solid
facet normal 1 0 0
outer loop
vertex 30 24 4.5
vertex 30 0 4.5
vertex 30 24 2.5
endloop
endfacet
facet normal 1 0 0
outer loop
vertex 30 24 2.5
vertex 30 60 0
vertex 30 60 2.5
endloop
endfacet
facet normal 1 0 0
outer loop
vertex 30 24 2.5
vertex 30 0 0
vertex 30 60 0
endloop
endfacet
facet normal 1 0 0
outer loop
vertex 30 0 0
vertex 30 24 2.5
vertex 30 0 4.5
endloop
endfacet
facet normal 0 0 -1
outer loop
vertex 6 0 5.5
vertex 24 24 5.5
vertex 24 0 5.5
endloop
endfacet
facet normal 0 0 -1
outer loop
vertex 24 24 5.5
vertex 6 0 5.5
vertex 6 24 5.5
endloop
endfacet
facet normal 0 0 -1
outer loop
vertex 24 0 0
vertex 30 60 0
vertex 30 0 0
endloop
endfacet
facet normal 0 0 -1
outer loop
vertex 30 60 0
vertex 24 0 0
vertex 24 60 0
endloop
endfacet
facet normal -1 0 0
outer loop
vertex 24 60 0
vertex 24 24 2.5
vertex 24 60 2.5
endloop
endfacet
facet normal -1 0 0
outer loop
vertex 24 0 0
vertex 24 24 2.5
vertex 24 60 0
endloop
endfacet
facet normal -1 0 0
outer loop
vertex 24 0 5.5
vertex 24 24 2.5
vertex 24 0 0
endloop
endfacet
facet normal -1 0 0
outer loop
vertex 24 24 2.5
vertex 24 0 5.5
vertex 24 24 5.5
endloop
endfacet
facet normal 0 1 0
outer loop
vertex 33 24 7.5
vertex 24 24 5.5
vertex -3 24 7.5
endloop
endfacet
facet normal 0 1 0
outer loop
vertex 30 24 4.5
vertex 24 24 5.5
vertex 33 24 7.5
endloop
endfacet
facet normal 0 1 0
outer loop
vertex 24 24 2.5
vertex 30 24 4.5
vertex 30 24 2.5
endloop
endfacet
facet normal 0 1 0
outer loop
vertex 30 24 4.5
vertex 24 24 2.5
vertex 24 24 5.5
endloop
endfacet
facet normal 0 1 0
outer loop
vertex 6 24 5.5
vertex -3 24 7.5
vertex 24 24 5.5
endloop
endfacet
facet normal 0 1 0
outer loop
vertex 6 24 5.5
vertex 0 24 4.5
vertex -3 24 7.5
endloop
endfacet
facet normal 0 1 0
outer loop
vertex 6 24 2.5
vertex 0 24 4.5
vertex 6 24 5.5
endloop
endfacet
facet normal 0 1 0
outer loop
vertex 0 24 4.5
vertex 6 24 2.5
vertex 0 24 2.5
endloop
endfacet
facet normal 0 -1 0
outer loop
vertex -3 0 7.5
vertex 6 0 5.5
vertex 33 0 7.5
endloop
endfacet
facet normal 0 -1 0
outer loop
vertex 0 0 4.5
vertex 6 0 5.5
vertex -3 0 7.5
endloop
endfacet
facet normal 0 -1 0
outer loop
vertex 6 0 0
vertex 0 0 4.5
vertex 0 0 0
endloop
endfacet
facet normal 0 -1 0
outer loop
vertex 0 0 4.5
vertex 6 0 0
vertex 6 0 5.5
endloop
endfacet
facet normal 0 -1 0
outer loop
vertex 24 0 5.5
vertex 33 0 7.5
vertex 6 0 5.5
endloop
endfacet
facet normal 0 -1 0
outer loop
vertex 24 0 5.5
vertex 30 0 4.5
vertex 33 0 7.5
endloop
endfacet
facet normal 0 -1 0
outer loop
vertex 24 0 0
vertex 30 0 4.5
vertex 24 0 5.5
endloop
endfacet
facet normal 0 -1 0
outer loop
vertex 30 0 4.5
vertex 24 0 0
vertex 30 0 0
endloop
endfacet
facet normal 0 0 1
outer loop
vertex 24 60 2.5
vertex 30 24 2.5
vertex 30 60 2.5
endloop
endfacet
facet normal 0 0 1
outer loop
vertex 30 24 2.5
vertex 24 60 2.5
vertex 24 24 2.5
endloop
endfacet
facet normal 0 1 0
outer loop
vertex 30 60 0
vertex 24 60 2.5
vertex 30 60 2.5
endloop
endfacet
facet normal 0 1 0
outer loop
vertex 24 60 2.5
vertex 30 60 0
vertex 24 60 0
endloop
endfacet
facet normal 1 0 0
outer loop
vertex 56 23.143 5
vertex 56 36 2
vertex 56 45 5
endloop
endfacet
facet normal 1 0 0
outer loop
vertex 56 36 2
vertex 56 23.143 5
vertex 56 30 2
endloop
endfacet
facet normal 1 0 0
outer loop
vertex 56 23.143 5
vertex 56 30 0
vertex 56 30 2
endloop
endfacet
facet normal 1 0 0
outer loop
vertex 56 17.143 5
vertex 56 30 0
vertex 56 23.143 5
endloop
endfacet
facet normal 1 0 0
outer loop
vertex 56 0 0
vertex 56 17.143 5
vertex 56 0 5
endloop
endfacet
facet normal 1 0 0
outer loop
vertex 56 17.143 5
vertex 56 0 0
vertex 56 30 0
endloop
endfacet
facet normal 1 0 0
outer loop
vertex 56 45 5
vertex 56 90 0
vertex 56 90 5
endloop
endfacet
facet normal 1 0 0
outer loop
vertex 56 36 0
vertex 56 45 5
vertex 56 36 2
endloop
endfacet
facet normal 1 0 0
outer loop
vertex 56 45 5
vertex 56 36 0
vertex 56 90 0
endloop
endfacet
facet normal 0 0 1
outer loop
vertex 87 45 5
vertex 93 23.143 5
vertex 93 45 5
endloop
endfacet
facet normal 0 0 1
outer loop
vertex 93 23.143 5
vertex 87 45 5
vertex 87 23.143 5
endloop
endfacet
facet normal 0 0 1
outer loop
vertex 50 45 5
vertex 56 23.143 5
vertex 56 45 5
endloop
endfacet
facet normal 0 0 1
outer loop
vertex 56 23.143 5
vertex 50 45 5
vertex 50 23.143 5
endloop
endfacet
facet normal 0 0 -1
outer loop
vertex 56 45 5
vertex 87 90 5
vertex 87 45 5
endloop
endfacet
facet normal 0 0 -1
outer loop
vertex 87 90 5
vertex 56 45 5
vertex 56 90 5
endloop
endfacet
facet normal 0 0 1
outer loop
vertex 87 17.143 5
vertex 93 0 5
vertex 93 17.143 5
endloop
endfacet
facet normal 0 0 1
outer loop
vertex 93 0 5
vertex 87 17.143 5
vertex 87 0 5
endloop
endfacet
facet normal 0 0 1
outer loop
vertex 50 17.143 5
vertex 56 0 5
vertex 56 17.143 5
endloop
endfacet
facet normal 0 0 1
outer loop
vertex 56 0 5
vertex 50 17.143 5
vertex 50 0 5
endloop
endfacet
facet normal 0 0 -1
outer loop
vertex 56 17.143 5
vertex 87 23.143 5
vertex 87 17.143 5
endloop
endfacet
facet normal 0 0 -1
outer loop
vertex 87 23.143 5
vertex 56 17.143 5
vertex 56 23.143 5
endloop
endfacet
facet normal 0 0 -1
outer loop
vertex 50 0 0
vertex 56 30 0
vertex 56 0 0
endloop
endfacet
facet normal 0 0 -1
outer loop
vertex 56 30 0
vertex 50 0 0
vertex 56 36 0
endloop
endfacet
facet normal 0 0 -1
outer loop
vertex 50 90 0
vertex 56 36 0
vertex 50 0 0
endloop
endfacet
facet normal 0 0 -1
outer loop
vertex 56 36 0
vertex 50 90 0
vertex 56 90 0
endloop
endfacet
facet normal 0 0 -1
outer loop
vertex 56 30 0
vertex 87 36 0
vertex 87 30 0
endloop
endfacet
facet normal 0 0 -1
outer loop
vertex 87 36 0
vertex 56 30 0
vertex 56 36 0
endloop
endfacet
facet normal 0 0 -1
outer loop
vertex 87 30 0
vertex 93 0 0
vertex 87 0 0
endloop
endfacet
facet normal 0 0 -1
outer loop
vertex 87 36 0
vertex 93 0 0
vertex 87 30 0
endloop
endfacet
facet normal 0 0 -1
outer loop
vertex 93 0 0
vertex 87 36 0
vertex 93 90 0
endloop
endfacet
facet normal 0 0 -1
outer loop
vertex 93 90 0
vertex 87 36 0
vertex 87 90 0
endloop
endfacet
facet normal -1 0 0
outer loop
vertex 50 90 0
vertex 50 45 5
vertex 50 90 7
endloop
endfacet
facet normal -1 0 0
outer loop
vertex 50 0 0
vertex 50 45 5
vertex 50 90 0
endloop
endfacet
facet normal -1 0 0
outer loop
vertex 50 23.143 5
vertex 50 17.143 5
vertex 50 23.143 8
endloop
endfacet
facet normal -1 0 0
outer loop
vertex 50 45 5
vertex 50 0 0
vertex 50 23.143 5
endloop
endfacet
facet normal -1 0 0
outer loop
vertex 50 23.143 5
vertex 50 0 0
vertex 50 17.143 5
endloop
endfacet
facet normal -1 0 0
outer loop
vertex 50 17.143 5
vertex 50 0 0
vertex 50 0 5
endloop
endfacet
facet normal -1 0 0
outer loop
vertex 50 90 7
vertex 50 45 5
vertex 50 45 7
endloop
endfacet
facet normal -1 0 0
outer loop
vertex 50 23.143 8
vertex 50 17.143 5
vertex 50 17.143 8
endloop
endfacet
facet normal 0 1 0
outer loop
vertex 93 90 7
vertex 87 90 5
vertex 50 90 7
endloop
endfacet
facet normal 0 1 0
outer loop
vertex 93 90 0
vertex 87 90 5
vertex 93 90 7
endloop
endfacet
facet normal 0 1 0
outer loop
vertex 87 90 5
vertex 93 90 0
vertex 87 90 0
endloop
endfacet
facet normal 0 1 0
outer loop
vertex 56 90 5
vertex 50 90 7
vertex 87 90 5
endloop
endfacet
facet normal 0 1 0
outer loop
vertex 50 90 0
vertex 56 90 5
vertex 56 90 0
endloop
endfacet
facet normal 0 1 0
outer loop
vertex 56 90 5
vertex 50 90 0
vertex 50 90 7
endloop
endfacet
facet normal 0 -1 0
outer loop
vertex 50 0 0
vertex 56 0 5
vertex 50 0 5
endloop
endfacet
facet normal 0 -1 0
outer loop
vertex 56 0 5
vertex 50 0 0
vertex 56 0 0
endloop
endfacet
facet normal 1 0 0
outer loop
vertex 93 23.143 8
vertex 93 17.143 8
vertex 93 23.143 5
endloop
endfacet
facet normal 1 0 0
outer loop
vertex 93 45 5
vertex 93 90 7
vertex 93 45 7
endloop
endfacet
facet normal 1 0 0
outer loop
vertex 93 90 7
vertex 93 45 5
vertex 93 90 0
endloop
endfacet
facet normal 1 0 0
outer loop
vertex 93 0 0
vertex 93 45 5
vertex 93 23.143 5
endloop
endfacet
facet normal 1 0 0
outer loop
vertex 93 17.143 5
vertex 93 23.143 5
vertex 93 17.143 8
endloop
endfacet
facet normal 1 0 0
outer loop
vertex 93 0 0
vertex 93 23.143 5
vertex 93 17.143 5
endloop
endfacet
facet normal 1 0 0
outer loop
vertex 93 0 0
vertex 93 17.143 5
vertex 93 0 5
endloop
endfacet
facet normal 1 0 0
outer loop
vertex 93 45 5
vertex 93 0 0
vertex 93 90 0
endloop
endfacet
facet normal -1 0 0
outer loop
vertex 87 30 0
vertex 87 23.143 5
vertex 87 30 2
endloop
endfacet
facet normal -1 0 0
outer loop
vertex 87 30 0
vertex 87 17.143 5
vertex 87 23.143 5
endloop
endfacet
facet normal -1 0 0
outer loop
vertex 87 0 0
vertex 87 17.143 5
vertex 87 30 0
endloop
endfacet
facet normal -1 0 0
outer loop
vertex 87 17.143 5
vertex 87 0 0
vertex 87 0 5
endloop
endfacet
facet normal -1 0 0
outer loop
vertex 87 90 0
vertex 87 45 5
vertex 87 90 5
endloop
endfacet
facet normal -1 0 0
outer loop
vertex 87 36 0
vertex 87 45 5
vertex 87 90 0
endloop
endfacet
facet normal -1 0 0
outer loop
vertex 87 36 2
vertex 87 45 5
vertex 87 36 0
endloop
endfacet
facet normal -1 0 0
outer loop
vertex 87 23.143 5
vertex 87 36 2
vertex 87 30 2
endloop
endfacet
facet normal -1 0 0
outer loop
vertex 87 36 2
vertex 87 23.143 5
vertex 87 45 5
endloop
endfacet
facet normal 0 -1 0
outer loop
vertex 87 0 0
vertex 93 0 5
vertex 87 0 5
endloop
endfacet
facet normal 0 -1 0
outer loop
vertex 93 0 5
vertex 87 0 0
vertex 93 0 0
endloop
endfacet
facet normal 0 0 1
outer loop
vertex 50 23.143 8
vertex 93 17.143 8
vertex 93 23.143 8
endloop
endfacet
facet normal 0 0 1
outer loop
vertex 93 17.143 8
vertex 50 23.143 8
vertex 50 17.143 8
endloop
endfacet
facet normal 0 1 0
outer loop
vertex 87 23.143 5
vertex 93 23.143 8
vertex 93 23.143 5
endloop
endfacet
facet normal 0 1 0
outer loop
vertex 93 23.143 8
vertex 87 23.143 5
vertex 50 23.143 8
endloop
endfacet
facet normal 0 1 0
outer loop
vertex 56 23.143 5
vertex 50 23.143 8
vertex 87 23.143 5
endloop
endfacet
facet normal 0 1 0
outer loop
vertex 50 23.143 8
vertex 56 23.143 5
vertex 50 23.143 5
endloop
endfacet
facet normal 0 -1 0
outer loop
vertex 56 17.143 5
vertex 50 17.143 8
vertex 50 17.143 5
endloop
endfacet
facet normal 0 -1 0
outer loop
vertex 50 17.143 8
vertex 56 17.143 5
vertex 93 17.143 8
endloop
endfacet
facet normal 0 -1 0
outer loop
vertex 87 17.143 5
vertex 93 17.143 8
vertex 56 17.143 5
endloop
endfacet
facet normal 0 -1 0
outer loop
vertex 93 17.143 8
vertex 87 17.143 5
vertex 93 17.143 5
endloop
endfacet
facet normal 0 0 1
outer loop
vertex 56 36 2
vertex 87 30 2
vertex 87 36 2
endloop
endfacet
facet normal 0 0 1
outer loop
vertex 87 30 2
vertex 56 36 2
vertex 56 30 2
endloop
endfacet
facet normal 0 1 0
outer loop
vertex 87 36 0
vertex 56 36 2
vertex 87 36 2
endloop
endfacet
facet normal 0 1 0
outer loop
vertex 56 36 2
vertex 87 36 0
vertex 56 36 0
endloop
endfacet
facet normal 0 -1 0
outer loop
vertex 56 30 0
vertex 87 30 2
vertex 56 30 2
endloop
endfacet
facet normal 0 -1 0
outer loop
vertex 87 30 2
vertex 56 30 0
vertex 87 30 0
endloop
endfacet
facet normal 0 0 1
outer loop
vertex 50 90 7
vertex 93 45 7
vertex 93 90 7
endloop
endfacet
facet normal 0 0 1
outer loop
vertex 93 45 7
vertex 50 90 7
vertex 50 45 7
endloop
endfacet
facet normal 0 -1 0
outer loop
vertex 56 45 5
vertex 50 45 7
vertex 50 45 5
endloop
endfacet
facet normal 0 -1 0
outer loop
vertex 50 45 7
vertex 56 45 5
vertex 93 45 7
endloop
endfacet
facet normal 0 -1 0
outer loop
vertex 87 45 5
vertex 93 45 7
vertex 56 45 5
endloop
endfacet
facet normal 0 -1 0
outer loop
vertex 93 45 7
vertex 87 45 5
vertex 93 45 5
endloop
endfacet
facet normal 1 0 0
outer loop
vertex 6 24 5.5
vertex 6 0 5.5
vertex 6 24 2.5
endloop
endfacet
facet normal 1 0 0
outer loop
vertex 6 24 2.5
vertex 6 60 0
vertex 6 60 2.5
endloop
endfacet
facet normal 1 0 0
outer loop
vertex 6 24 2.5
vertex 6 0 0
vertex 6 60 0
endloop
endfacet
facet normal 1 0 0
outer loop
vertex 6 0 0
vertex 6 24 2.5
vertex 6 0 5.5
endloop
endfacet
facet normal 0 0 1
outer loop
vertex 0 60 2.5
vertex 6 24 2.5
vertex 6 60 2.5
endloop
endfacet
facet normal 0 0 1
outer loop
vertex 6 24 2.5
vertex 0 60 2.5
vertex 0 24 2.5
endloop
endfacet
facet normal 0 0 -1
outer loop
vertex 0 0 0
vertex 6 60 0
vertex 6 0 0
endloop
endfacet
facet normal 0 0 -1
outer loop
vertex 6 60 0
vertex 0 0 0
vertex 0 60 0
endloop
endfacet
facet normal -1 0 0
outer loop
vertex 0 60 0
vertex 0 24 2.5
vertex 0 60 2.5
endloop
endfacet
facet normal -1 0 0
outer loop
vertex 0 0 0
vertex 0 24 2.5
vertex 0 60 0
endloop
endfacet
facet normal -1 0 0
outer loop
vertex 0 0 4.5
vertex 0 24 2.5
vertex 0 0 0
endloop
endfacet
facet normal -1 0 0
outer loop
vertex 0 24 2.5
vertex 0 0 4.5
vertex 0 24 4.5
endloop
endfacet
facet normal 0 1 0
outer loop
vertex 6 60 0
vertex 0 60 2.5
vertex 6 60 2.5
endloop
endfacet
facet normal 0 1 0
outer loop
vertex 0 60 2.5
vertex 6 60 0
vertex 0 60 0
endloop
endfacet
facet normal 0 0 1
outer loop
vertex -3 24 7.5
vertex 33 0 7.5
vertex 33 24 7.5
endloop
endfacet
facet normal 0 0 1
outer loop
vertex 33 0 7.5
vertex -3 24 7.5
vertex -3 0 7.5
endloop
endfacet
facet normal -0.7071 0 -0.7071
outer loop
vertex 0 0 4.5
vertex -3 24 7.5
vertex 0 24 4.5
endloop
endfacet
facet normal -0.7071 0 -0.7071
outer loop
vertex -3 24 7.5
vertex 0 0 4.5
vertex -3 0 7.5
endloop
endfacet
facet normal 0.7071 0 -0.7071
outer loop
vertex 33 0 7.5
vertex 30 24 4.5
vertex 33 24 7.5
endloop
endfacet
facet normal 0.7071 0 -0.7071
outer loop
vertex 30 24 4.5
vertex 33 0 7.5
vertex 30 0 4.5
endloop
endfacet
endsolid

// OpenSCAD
//distance between legs
dl = 24;

//seat leg width
lw = 6;

//back leg width
blw = 6;

//leg thickness
lth = 5;

//leg length
ll = 60;

//give between legs and legs

give = .5;



//legs
cube([lw, ll, lth-2-give]);
cube([lw, 2*ll/5, lth-give+1]);
translate([dl,0,0])
{
cube([lw, 2*ll/5, lth-give+1]);
cube([lw, ll, lth-2-give]);
}

//seat
translate([0,0,lth-give+1])
cube([dl+lw, 2*ll/5, 2]);



translate([-lw/2,0,lth-give+2+1])
rotate([-90,0,0])
linear_extrude(height=2*ll/5)
polygon(points=[[0,0],[lw,0],[lw,lw]]);



translate([lw/2+dl,0,lth-lw-give+2+1])
rotate([-90,-90,0])
linear_extrude(height=2*ll/5)
polygon(points=[[0,0],[lw,0],[lw,lw]]);



//back support
translate([50,0,0]){

//legs
cube([blw, ll*1.5, lth]);
translate([dl+lw*2+give*2,0,0])
cube([blw, ll*1.5, lth]);


//bars
translate([0,ll/3.5,lth])
cube([dl+lw*2+give*2+lw, lw, 3]);


translate([0,ll/2,0])
cube([dl+lw*2+give*2+lw, lw, 2]);

//seat
translate([0,ll*3/4,lth])
{
cube([dl+lw*3+give*2, ll*3/4, 2]);

}




}
